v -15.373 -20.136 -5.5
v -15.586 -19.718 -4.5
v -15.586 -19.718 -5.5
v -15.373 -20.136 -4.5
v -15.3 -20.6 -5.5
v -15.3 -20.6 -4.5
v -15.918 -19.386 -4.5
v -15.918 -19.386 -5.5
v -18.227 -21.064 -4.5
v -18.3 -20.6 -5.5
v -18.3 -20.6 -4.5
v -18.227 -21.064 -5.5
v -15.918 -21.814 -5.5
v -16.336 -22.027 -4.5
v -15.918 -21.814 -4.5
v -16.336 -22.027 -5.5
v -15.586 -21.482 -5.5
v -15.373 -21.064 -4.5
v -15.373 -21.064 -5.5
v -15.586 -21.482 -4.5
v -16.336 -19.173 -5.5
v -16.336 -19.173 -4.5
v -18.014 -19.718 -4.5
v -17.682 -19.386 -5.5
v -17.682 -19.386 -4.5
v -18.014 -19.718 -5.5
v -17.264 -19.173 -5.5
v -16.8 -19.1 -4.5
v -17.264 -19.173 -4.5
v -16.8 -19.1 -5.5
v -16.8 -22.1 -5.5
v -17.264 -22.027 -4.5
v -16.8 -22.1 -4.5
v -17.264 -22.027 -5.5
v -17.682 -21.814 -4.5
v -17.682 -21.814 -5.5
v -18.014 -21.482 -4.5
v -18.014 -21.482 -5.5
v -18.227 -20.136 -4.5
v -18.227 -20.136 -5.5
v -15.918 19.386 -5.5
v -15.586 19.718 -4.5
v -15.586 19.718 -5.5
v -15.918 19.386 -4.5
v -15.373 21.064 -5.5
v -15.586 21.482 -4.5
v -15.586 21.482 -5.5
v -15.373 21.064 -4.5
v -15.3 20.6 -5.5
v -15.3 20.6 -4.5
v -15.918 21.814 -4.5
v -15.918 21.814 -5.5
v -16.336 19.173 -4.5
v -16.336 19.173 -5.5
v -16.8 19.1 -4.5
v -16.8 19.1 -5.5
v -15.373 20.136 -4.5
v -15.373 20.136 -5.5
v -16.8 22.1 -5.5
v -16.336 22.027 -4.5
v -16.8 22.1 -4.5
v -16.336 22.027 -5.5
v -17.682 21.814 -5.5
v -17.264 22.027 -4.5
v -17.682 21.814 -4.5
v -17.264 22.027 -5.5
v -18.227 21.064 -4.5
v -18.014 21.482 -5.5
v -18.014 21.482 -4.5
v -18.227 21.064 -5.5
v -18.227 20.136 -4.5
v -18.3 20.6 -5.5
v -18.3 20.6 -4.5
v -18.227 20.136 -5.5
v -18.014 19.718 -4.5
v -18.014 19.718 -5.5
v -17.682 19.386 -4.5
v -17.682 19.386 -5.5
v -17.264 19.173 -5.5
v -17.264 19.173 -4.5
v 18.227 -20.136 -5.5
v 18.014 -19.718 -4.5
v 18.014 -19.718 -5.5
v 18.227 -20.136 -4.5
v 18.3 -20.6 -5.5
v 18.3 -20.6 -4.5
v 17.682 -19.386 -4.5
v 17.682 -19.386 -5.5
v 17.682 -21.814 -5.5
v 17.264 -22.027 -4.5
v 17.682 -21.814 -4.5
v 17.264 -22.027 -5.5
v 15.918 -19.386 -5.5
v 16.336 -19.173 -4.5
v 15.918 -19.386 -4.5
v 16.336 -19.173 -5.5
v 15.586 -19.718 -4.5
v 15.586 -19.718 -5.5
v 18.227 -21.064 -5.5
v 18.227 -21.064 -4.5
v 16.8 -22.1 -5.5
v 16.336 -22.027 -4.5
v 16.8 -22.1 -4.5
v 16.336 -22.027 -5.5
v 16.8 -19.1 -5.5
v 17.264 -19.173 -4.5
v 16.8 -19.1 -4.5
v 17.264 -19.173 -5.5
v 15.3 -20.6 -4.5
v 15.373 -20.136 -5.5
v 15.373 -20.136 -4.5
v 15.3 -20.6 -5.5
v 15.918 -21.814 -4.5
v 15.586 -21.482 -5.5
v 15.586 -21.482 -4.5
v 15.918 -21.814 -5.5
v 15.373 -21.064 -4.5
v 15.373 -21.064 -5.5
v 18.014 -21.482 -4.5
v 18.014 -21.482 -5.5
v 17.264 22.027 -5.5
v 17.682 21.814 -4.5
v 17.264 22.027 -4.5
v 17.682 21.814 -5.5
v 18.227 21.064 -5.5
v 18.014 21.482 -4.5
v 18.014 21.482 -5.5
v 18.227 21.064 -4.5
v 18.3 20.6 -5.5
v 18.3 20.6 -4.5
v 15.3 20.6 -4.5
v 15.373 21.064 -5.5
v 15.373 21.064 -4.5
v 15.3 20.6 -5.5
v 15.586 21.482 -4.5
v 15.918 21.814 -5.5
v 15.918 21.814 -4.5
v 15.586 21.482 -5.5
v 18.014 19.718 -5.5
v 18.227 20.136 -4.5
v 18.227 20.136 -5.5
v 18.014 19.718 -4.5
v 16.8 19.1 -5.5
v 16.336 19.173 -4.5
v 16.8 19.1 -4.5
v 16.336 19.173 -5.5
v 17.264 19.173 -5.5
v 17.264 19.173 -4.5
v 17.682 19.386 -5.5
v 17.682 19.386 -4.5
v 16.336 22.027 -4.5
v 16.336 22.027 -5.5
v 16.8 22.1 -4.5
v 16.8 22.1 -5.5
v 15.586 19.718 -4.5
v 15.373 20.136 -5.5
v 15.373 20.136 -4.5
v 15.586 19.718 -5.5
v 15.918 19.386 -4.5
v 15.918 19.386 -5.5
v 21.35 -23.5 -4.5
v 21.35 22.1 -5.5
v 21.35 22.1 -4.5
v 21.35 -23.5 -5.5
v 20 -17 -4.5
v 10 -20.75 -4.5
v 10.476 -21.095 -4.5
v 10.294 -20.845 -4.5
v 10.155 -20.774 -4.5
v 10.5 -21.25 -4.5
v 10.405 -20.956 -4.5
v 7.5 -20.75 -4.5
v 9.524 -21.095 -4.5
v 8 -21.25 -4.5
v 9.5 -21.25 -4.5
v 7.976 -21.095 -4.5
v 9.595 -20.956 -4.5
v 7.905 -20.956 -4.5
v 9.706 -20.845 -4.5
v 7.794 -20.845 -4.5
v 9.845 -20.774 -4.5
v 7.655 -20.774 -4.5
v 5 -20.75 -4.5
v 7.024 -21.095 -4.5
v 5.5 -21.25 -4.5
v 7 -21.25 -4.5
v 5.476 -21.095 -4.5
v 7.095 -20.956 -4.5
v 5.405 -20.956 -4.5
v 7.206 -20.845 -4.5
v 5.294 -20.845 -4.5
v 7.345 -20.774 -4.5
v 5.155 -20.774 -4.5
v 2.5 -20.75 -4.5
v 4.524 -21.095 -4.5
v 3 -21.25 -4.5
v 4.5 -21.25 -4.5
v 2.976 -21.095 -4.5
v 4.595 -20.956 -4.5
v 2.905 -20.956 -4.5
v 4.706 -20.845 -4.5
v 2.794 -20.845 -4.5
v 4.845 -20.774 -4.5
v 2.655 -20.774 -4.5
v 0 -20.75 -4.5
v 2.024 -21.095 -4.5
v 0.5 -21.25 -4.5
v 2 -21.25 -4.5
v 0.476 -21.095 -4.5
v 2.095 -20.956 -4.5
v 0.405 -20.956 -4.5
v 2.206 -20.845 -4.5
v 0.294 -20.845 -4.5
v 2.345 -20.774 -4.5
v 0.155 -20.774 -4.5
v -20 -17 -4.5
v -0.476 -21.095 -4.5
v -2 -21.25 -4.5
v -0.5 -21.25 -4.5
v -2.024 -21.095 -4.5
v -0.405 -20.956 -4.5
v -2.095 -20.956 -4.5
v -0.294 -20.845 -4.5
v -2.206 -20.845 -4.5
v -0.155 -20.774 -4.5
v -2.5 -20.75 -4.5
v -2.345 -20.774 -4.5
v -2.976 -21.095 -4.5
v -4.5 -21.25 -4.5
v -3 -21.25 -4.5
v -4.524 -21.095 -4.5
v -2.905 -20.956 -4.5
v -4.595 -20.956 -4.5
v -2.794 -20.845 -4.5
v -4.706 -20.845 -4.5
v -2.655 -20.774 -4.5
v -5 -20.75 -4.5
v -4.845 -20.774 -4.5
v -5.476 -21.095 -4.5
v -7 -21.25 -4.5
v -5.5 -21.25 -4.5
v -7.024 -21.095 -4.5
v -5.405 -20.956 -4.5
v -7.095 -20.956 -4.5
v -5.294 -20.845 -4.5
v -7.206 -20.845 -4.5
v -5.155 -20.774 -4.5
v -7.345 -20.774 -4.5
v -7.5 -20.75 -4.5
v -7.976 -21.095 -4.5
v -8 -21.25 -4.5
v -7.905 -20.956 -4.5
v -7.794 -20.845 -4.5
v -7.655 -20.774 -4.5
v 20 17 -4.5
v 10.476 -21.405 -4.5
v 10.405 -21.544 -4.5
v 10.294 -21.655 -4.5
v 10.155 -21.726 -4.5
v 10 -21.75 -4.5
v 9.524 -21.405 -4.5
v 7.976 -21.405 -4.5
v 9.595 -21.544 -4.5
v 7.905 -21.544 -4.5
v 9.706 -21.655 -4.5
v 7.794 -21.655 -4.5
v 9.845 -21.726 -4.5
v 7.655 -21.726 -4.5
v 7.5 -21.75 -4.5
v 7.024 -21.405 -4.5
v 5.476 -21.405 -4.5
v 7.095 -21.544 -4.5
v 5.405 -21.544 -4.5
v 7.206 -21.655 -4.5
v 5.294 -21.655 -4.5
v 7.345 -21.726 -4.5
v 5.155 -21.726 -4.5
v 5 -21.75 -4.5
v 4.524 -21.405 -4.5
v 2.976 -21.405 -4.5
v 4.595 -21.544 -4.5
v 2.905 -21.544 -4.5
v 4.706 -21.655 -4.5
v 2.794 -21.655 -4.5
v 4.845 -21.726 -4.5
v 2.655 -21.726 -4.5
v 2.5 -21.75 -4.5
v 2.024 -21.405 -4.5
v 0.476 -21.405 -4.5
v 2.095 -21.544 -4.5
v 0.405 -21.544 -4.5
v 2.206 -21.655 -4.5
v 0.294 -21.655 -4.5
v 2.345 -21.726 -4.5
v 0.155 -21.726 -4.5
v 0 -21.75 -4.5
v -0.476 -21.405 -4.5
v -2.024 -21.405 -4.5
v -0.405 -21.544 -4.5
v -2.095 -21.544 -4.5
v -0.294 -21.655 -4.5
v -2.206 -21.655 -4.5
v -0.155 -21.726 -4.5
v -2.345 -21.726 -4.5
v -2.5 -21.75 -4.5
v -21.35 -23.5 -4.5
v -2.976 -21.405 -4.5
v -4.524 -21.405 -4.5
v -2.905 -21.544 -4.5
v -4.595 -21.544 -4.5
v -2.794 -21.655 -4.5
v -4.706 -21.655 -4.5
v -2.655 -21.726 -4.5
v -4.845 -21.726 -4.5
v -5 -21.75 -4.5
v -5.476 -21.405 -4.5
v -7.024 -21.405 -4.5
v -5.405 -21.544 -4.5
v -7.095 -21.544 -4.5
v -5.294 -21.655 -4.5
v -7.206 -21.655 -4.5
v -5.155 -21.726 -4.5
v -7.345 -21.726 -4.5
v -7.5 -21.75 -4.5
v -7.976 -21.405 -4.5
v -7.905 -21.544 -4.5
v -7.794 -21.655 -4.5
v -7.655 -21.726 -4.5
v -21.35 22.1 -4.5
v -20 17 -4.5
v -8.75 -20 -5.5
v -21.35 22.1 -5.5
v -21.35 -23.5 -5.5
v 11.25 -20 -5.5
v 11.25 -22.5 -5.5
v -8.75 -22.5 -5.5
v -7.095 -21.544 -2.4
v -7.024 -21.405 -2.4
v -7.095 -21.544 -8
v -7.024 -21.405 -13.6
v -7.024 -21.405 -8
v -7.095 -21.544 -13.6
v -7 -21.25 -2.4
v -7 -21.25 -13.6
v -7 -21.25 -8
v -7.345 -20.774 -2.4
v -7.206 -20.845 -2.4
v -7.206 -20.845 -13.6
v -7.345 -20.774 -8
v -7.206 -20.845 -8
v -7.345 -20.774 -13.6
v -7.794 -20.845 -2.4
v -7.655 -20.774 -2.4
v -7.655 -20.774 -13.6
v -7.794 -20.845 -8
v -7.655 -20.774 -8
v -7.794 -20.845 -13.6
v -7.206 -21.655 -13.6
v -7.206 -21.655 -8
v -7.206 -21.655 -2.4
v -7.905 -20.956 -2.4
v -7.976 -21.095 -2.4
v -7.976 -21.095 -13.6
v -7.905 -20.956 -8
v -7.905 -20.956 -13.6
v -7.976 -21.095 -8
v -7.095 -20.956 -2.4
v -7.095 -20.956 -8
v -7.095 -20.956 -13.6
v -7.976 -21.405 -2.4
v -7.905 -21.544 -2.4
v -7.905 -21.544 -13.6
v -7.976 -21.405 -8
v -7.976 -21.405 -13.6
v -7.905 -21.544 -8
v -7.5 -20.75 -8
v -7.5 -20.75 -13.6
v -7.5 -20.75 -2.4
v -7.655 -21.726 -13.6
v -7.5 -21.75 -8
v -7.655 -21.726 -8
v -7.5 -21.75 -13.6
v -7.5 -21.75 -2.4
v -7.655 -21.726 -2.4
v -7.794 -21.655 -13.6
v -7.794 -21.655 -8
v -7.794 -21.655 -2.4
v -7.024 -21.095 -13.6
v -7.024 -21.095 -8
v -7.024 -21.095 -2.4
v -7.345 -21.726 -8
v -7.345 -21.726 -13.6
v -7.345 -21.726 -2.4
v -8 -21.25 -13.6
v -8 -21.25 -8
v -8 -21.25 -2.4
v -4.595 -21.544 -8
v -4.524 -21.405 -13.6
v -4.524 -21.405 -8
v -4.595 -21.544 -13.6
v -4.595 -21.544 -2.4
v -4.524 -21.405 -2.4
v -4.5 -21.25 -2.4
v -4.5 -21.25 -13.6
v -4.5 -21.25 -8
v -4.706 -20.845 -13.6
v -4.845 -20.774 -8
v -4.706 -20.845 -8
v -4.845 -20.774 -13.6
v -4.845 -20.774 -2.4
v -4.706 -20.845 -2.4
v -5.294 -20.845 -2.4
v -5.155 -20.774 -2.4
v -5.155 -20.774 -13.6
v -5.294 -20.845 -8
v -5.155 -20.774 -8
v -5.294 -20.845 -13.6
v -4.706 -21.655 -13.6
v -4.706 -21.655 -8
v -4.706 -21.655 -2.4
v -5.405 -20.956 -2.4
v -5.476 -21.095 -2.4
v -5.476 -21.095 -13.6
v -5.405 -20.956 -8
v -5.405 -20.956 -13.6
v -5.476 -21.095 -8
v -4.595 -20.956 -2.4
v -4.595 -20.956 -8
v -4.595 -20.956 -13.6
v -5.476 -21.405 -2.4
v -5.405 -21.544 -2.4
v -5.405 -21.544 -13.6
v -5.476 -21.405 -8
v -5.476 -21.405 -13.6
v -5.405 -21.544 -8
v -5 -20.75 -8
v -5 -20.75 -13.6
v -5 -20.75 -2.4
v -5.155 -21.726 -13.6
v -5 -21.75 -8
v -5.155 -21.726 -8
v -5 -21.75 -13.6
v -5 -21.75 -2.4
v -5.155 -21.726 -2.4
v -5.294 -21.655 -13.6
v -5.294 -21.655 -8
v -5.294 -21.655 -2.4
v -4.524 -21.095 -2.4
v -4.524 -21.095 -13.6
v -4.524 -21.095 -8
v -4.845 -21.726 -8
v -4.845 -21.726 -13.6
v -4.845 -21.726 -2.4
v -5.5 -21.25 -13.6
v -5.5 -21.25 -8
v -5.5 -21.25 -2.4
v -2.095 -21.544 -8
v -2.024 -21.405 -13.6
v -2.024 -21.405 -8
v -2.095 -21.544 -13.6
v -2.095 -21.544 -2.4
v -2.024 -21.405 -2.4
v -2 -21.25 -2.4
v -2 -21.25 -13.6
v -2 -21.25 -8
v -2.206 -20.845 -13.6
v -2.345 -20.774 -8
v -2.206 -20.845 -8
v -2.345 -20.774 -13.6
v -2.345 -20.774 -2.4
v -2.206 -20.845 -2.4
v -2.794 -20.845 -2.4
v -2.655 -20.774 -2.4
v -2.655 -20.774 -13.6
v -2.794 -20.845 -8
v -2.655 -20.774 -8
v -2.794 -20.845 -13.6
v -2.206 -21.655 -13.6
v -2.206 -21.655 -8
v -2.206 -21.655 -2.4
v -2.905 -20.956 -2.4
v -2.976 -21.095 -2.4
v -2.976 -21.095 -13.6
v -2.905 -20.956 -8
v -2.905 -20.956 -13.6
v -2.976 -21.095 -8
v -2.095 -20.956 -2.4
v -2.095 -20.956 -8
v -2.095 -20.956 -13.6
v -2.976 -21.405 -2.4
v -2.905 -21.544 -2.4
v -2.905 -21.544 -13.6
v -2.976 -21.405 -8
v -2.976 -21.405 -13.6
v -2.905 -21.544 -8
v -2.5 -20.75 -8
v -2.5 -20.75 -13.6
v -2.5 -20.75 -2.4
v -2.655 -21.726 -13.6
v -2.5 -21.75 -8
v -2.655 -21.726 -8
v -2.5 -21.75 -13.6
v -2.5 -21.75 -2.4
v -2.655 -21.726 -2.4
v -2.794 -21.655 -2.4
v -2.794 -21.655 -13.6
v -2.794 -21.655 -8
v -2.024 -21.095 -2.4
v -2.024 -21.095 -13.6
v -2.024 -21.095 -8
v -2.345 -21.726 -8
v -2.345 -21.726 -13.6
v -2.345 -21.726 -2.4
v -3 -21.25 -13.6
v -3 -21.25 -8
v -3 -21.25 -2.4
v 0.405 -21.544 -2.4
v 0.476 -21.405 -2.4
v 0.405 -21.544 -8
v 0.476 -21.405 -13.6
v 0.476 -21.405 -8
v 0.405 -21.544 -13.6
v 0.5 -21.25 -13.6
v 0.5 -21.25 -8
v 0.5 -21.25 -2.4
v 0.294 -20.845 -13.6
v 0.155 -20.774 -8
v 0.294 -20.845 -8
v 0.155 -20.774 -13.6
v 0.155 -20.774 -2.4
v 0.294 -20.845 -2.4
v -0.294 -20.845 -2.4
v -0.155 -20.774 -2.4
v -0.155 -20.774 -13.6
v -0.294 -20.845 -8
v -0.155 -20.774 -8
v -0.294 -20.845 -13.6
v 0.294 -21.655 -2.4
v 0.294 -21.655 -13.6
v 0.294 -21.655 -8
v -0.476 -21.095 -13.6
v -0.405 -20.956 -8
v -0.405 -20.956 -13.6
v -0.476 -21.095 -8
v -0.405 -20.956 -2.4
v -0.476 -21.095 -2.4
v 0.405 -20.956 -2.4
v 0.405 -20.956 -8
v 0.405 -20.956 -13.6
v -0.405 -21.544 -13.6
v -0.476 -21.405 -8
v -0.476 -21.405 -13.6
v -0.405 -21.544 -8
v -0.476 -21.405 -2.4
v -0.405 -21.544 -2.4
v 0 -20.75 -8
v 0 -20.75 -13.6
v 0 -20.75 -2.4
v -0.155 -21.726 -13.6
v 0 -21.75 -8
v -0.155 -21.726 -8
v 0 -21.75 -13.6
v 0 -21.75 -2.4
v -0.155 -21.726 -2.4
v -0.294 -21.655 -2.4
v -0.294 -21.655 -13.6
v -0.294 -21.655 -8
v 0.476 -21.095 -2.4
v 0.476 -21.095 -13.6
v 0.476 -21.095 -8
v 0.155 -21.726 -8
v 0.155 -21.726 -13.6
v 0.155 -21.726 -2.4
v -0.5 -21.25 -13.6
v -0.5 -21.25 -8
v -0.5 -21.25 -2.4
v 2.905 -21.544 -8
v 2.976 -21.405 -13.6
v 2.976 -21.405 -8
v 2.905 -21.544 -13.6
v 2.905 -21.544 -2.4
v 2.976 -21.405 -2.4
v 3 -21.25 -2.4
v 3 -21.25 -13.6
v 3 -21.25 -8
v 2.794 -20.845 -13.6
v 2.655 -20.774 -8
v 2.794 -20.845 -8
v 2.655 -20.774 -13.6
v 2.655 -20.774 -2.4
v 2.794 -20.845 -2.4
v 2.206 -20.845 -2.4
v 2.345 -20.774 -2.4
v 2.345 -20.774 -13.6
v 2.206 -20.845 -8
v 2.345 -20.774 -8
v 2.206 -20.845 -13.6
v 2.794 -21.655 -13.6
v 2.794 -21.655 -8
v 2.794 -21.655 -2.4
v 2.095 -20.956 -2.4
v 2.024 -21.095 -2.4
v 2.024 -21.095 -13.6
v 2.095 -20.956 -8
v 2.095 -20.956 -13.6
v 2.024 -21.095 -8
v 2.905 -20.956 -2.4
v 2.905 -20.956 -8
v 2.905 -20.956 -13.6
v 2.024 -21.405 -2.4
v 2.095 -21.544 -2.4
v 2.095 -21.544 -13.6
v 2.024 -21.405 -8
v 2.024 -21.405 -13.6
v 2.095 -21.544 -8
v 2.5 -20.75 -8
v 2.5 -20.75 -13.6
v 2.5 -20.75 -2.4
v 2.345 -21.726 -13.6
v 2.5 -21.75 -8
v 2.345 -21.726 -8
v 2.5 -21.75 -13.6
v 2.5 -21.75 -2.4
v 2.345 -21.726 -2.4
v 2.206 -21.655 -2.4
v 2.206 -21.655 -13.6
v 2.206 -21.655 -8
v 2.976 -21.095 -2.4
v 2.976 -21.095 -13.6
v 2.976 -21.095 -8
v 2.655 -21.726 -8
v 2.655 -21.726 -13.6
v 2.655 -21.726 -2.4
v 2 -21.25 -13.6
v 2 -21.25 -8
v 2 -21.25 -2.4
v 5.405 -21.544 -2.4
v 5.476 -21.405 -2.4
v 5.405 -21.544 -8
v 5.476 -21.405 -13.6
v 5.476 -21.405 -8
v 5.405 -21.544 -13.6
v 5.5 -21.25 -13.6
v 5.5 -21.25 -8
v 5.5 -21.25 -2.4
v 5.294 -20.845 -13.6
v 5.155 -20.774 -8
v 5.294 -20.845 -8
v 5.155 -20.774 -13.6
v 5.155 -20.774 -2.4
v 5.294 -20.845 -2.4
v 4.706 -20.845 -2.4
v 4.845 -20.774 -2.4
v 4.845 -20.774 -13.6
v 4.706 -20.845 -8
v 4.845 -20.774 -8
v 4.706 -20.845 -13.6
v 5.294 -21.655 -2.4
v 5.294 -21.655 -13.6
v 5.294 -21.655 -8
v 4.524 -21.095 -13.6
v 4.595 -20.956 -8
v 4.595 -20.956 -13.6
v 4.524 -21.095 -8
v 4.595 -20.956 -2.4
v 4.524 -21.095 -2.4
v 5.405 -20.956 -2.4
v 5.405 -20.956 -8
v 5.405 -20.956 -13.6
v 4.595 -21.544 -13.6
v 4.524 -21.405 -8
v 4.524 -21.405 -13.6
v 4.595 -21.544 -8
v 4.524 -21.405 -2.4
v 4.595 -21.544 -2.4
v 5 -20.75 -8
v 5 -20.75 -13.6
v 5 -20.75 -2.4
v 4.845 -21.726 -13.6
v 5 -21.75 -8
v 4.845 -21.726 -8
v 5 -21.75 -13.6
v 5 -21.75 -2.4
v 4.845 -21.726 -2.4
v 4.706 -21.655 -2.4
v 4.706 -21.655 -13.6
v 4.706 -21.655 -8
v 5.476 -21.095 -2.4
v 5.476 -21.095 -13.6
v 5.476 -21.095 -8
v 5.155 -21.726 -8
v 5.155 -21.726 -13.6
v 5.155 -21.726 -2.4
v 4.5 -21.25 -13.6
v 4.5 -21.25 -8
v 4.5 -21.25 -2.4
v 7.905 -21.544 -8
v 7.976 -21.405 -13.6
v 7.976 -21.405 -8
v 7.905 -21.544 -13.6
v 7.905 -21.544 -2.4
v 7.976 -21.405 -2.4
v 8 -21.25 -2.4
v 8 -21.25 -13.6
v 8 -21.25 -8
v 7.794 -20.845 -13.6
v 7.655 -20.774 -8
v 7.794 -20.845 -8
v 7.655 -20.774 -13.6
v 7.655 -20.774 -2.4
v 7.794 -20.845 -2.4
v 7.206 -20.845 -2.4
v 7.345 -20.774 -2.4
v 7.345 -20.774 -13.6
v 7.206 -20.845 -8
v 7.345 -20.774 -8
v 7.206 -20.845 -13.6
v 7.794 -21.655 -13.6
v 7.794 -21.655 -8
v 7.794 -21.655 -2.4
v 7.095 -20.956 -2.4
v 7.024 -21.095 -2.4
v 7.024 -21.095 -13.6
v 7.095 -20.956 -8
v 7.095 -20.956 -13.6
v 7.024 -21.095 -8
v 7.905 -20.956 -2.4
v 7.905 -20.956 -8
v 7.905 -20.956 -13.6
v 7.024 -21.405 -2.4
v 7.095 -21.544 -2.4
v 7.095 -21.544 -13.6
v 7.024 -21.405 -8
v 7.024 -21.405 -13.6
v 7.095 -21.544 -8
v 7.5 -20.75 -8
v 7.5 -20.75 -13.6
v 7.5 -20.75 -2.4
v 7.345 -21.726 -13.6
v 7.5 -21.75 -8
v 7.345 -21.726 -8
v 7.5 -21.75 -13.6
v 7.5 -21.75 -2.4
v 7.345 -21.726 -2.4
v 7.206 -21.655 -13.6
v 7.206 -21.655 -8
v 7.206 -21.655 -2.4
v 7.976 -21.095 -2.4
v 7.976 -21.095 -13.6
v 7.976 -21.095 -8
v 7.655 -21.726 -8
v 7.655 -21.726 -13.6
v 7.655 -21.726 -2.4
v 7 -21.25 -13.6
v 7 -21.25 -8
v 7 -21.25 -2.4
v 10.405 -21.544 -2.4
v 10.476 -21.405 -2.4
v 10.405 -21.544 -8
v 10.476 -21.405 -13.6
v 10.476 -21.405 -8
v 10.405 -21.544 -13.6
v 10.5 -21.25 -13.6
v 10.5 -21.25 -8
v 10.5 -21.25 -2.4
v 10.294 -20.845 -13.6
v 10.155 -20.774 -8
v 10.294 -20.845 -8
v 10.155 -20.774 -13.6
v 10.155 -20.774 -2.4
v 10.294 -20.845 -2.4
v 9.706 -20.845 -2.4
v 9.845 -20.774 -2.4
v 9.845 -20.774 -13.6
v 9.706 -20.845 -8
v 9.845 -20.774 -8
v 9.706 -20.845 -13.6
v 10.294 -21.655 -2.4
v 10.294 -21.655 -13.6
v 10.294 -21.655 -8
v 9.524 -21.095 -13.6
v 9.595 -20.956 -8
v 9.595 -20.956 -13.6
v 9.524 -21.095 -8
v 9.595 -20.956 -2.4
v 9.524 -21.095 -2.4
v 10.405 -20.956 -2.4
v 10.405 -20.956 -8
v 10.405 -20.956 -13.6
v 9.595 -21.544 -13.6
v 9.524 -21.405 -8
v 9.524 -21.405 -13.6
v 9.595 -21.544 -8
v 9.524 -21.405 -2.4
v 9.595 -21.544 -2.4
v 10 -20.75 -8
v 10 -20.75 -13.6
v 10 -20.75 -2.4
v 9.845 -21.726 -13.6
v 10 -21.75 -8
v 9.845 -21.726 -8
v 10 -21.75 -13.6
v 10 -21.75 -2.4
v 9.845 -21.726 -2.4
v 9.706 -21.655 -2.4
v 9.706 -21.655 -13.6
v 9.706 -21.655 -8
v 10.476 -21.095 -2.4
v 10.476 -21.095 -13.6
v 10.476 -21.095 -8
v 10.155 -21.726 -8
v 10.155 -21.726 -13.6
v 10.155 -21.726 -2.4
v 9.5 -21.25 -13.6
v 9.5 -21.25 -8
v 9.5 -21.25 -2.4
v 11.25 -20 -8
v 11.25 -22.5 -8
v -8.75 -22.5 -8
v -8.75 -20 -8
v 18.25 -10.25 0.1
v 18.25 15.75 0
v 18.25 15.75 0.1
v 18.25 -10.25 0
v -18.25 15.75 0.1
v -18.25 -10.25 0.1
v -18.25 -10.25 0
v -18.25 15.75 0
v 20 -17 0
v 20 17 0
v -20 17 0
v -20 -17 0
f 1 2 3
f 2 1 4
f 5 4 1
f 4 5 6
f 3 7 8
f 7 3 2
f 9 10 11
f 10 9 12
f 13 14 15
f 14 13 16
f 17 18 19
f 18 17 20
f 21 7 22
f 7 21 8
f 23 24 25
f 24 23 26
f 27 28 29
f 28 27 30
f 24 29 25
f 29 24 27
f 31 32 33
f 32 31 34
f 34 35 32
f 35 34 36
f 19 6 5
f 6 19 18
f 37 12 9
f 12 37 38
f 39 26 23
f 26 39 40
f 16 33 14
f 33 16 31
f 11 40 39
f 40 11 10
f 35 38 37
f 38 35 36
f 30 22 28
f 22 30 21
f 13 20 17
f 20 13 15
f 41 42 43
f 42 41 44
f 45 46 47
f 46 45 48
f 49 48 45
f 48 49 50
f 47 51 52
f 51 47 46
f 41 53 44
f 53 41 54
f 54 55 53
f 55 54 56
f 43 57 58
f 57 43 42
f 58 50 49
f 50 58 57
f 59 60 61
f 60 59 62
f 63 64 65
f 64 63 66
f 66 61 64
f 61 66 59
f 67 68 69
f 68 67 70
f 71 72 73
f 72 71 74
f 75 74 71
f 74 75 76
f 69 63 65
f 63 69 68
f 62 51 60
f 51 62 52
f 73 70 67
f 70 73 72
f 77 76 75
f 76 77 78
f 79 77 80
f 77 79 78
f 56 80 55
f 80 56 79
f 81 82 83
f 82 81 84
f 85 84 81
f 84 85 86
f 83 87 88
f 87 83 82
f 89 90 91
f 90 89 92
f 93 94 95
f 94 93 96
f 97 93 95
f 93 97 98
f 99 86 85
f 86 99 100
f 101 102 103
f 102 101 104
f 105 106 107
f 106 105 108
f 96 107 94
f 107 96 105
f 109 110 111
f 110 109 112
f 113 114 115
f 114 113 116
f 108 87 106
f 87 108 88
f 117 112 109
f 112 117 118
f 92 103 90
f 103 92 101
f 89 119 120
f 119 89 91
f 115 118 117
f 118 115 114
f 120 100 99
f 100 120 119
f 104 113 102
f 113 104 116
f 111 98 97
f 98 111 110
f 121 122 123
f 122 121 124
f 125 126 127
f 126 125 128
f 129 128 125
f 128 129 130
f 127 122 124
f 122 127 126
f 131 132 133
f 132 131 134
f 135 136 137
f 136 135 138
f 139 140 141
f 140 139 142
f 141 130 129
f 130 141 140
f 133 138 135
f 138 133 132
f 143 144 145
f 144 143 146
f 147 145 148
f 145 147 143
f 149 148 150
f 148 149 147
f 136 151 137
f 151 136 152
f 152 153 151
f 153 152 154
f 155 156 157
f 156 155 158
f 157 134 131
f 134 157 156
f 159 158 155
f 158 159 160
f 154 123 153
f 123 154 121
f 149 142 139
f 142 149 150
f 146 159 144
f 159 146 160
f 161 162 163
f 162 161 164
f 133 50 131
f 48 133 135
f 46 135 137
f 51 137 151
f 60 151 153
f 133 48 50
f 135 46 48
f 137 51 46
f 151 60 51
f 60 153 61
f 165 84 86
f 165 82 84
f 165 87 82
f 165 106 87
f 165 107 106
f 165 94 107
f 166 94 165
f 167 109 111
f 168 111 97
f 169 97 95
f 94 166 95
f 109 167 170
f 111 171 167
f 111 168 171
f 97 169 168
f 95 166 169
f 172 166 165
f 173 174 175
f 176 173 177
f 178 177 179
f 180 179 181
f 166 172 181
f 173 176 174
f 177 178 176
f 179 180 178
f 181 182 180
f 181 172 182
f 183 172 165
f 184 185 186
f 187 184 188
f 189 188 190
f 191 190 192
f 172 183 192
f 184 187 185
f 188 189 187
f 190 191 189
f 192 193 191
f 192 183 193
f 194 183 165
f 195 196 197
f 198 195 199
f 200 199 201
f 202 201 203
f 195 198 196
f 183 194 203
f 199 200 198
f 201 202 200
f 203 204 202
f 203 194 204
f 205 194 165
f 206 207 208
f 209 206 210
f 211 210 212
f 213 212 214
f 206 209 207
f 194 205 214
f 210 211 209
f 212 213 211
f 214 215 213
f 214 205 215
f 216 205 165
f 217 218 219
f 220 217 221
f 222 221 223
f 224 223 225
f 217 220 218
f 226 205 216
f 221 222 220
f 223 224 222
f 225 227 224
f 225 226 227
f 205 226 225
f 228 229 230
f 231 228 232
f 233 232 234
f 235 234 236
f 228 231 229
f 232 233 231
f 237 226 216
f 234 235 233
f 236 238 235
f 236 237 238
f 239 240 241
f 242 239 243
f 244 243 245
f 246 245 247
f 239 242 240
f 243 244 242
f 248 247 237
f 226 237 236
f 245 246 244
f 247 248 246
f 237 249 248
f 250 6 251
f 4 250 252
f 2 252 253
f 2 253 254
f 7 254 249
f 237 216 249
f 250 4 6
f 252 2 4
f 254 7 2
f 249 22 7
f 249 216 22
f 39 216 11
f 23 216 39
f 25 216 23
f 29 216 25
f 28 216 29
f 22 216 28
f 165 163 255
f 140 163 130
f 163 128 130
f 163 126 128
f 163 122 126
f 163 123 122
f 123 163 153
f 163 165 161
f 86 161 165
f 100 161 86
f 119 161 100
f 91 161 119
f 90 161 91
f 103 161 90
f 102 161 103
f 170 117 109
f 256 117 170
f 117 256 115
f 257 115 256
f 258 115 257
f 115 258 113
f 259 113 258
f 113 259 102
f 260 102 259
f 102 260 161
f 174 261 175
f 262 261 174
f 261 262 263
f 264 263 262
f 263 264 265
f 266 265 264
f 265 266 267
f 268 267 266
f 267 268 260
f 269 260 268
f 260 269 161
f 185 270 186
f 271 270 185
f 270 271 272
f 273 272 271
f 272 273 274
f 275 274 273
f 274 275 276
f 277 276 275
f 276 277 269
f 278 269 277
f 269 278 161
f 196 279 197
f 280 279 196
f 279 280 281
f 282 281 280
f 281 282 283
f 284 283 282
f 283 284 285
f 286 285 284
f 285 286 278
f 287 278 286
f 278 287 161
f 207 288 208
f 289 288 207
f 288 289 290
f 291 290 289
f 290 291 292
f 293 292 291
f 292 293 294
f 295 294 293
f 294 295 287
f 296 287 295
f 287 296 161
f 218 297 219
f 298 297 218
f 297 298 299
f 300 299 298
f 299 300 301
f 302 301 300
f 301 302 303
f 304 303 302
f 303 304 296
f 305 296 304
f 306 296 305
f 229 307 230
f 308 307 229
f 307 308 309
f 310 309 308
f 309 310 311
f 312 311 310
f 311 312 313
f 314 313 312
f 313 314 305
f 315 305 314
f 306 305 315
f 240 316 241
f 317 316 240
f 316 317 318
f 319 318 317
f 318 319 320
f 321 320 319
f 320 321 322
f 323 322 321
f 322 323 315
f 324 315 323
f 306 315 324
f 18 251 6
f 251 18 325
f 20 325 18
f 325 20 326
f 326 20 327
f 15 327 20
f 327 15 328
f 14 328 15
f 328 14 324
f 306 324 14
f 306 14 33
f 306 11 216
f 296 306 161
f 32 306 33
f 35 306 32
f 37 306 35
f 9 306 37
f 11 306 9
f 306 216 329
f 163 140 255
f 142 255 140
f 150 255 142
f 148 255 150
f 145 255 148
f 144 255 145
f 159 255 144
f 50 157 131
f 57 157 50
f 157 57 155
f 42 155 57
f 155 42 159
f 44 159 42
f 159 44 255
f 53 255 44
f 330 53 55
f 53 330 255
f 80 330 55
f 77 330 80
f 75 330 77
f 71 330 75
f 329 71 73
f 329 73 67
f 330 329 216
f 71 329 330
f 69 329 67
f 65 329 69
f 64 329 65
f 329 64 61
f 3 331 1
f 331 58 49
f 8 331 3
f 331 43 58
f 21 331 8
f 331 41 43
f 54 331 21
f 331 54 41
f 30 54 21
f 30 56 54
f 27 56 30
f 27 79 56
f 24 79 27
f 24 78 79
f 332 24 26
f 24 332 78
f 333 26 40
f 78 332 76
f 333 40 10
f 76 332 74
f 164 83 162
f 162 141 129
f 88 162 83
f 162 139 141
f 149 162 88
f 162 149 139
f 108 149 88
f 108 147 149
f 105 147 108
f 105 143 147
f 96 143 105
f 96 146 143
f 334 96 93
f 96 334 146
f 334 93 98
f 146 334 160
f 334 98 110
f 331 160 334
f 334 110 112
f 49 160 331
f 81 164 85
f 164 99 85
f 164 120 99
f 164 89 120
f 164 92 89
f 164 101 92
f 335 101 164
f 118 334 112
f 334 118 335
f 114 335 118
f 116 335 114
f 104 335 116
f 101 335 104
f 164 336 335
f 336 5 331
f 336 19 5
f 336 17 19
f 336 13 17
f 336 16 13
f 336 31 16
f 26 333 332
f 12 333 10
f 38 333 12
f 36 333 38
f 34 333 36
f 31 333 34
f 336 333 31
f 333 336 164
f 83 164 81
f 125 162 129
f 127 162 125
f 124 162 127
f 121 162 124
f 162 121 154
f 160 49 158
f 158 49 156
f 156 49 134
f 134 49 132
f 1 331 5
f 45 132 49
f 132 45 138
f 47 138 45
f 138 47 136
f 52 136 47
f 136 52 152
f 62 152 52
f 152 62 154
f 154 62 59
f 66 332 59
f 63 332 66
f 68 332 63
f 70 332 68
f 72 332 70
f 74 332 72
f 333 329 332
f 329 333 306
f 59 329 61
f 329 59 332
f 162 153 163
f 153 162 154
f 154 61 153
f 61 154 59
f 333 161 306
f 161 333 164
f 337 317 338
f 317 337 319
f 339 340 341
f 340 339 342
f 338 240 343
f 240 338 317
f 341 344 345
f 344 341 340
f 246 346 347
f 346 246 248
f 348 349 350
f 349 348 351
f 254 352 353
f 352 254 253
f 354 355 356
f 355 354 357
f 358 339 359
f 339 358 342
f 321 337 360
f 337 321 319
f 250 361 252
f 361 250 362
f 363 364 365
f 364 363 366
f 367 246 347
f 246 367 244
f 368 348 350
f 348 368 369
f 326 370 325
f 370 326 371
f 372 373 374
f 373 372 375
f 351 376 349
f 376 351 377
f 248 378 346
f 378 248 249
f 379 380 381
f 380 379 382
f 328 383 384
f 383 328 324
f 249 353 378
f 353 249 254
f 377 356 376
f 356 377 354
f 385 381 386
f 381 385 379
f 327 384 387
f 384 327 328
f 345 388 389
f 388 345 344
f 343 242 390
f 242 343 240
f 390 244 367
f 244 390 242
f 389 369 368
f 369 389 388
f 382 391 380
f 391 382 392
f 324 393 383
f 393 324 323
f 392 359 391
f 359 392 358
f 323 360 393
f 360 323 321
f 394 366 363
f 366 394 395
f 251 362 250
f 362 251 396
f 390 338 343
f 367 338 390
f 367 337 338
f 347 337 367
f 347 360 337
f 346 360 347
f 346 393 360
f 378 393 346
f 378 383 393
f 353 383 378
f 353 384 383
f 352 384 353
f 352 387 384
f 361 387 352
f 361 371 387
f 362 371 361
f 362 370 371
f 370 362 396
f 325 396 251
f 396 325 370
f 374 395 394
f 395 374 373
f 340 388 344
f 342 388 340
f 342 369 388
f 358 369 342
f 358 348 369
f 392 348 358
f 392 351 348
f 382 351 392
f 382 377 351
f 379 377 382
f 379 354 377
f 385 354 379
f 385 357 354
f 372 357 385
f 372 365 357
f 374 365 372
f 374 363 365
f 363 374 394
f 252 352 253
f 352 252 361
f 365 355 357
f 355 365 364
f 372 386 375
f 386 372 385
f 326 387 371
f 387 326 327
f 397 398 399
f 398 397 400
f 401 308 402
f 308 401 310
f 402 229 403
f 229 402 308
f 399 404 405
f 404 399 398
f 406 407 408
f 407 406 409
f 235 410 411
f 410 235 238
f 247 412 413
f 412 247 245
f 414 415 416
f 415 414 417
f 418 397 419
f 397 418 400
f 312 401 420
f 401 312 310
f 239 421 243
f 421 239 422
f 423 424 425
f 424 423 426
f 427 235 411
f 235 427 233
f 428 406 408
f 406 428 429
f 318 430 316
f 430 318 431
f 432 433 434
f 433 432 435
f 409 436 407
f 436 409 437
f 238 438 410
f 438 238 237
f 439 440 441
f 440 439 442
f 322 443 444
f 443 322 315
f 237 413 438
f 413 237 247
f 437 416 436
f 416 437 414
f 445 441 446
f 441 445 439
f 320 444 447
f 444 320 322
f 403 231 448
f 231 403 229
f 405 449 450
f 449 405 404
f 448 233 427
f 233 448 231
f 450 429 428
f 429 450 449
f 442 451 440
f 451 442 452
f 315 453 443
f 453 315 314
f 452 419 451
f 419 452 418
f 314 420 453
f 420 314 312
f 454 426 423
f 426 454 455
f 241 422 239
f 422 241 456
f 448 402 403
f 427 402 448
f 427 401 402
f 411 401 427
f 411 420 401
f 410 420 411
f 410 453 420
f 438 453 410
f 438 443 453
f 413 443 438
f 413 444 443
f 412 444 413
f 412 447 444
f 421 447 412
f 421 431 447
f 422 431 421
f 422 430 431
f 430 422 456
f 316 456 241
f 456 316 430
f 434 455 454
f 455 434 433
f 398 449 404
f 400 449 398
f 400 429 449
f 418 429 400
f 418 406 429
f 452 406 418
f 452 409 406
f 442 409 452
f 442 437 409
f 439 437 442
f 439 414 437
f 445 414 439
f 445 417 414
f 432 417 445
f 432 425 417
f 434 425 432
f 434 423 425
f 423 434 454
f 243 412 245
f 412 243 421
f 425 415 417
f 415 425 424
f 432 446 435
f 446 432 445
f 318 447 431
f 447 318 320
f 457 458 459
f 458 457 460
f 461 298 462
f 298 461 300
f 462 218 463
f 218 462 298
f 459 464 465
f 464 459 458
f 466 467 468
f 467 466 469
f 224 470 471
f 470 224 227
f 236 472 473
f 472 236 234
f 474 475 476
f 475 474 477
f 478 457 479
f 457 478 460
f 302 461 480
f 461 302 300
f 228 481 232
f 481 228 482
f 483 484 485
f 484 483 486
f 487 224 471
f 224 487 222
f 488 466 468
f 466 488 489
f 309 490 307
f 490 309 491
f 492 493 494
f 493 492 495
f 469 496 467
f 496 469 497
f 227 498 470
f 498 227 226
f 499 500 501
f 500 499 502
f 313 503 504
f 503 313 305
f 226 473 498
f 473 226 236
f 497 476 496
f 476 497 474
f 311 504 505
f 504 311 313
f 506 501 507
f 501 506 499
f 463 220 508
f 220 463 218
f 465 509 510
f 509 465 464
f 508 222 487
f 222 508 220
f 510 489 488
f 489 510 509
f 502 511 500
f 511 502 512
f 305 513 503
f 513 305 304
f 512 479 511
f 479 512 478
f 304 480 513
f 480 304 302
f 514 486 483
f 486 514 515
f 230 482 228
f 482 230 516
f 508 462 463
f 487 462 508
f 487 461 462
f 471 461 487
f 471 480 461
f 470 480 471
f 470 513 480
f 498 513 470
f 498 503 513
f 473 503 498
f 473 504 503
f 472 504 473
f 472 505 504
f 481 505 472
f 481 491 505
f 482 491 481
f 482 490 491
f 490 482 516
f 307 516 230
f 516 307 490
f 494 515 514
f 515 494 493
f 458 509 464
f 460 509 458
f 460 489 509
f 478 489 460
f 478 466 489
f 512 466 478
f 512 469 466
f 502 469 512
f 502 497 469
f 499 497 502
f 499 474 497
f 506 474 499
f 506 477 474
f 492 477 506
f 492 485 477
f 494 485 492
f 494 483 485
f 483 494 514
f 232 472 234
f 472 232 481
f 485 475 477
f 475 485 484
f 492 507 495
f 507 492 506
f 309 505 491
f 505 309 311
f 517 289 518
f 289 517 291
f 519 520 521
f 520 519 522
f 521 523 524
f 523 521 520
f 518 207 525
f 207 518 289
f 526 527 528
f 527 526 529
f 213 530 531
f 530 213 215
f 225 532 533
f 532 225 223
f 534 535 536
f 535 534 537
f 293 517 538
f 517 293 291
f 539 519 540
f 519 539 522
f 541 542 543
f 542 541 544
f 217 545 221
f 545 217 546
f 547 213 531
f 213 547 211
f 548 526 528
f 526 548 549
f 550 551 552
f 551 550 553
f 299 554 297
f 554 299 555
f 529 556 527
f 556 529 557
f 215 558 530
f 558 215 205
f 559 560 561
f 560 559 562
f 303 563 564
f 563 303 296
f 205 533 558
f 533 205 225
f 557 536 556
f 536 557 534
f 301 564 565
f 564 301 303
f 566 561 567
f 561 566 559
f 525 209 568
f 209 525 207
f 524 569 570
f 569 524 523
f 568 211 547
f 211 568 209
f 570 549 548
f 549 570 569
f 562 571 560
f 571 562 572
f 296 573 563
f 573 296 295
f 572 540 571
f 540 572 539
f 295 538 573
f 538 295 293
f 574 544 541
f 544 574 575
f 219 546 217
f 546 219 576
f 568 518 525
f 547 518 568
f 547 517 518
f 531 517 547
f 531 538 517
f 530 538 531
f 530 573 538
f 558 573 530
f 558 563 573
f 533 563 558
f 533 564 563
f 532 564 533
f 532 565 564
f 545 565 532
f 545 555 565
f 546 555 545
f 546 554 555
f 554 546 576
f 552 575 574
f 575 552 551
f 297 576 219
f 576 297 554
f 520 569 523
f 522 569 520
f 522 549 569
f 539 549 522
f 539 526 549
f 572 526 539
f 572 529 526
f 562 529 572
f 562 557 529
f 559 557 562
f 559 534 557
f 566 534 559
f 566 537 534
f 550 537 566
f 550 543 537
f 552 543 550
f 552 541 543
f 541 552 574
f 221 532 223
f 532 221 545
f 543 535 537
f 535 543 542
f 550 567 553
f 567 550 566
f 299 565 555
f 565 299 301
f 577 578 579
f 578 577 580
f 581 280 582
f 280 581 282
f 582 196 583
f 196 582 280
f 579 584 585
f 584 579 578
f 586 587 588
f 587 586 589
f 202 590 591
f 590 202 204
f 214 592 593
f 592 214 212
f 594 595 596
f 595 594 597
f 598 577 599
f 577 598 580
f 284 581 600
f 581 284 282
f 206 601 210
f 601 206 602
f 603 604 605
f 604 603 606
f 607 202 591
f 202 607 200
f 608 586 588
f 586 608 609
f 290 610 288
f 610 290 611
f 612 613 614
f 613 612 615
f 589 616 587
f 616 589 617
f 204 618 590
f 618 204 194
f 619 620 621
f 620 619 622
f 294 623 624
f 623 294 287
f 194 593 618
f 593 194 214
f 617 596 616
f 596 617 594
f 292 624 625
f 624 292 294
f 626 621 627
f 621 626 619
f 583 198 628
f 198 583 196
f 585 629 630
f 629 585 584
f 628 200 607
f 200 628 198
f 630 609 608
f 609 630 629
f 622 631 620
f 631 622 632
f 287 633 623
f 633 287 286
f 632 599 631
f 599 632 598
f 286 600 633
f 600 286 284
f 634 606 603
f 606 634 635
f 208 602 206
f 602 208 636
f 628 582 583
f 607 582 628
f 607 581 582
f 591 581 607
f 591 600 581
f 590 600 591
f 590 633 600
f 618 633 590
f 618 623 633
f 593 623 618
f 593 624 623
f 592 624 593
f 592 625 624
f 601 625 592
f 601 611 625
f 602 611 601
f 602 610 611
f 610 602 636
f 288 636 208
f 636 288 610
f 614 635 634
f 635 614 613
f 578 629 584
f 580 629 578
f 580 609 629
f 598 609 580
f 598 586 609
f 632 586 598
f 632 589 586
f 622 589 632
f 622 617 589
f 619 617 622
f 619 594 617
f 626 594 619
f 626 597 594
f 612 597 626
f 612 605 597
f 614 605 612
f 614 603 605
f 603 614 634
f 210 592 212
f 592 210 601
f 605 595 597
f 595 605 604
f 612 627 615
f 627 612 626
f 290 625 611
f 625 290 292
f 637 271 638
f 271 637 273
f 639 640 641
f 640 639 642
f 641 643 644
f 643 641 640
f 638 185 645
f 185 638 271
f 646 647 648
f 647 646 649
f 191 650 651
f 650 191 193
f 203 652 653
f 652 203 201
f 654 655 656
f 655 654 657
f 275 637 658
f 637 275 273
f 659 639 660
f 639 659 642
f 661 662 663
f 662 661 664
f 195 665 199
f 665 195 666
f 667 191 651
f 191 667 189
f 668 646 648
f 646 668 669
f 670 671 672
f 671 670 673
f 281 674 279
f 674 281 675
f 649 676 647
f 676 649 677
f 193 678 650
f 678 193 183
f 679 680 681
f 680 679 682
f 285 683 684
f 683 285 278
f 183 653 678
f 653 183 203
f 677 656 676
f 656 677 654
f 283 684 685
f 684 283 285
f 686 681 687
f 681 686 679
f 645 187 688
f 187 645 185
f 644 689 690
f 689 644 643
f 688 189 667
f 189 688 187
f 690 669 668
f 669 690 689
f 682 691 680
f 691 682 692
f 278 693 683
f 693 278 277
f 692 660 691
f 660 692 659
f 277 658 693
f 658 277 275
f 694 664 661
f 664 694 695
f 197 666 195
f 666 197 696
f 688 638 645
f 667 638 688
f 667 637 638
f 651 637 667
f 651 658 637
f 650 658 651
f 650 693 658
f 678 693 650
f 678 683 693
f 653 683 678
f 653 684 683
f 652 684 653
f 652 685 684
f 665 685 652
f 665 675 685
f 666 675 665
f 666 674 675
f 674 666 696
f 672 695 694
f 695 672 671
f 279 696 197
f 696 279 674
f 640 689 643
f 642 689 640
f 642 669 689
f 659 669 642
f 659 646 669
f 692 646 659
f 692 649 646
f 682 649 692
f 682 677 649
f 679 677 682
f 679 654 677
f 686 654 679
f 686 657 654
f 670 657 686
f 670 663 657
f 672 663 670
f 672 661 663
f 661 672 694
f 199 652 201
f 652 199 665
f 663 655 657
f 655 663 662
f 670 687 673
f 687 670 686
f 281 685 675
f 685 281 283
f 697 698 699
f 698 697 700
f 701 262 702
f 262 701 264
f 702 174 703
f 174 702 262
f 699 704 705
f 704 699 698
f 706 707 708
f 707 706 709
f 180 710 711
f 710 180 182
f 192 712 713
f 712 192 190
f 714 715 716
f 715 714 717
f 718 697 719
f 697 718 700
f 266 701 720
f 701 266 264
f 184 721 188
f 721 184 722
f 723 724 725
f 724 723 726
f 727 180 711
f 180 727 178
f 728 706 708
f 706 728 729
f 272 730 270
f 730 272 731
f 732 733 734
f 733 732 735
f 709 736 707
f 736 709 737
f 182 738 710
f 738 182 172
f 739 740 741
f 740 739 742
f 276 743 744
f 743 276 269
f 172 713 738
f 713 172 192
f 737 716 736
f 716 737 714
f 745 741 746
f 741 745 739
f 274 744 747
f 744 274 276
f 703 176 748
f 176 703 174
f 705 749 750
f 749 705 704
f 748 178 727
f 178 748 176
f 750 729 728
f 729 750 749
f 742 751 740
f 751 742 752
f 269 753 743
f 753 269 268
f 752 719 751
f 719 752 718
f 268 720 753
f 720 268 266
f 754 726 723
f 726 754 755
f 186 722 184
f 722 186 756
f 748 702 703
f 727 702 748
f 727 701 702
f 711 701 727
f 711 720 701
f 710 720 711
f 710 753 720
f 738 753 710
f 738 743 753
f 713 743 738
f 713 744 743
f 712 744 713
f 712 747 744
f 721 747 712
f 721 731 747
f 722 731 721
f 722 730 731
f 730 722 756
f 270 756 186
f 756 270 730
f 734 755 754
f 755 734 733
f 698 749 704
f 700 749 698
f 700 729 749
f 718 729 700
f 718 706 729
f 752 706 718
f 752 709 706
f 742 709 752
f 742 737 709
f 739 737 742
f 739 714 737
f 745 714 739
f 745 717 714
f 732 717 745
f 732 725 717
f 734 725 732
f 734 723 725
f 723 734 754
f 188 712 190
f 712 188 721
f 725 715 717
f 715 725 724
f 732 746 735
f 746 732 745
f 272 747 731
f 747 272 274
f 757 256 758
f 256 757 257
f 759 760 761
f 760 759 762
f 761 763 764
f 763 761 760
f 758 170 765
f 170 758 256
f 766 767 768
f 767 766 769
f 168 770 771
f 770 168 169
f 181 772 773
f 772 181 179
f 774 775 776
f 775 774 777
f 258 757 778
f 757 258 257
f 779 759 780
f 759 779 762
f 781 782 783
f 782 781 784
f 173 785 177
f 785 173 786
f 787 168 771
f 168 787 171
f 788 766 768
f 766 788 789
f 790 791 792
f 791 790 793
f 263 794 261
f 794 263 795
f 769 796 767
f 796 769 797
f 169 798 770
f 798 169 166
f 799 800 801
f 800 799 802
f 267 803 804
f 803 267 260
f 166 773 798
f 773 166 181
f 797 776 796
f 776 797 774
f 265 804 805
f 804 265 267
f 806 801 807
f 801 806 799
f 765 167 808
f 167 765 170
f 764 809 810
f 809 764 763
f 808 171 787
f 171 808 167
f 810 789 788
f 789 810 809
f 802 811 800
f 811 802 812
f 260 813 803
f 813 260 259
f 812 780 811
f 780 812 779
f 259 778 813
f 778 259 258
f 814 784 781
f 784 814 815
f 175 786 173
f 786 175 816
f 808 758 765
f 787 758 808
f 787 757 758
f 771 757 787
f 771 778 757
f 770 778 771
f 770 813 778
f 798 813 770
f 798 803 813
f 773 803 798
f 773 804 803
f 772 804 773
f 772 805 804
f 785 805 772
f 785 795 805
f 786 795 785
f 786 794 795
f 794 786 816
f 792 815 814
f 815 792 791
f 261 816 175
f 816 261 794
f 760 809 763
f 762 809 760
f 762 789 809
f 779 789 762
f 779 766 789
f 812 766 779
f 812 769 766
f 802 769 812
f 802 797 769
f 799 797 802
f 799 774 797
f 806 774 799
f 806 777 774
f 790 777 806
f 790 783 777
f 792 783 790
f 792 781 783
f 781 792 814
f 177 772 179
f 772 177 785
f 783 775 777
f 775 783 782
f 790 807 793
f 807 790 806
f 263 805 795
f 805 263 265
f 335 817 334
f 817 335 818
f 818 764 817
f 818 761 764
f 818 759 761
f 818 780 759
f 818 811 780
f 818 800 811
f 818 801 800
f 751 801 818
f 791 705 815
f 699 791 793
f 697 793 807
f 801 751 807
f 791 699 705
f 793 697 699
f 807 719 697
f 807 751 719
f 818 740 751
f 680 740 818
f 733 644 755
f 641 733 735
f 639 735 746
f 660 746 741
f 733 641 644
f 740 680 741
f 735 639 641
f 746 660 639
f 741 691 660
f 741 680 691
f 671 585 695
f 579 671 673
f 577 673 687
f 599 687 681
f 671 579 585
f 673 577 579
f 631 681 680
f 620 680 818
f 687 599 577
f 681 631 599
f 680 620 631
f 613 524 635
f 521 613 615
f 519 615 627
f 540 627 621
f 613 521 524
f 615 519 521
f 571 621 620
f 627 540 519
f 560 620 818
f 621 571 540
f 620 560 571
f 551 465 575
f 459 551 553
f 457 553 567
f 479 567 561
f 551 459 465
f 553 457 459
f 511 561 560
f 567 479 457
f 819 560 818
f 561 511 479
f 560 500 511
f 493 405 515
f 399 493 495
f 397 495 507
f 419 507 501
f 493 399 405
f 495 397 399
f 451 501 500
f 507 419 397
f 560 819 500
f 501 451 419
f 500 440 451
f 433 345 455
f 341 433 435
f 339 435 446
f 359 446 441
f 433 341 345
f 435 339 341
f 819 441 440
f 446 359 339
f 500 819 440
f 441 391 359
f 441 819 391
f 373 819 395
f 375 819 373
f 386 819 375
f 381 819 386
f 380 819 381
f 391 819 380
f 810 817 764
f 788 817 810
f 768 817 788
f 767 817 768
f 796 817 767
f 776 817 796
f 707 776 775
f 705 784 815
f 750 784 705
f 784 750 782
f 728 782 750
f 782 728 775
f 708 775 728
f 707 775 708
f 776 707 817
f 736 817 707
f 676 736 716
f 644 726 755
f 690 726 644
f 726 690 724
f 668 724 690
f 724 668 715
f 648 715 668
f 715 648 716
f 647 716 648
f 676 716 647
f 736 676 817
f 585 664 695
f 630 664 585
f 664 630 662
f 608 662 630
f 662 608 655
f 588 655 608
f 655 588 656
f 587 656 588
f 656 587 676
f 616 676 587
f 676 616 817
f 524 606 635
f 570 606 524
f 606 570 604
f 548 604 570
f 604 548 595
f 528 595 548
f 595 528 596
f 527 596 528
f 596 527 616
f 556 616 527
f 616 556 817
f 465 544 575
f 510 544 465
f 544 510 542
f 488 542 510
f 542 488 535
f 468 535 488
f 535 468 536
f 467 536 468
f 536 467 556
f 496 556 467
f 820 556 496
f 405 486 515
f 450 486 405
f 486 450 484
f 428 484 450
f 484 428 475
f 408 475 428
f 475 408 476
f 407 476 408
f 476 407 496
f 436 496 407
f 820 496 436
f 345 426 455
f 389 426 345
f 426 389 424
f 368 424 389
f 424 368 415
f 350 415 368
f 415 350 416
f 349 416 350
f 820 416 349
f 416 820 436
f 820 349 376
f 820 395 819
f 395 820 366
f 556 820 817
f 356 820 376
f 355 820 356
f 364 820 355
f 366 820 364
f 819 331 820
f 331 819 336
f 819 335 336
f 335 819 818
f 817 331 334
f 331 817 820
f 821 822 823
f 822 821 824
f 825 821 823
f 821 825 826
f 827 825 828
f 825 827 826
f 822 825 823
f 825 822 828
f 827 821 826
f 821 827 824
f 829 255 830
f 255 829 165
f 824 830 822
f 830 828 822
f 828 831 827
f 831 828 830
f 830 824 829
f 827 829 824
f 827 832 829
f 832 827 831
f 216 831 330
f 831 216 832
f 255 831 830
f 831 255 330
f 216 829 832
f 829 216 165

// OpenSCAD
// file: maleHeader.scad
module maleHeader(pins=40,pinLength=11.2,rotation=0){
    length=2.5 * pins;
    color("Black") cube([length,2.5,2.5]);  //plastic base
    for (i=[0:pins-1]){ //pins
        translate([1.25+2.5*i,1.25,2.5]) color("white") cylinder(r=0.5,h=pinLength,center=true,$fn=20);
    }
}
maleHeader(pins=5,pinLength=7);
// main file
use <maleHeader.scad>

module oledDisplay(xCtrs=33.6,yCtrs=41.2){
    translate([0,0,-5.5]){    //  set origin
        translate([0,2.75,5.5]) color("grey") cube([36.5,26,0.2],center=true); //view area
        translate([0,0,3.25]) color("white") cube([40,34,4.5],center=true);  //screen
        difference(){
            translate([0,-0.7,0.5]) color("SteelBlue") cube([42.7,45.6,1],center=true);    //pcb
            for (i=[-1:2:1],j=[-1:2:1]){
              translate([i*xCtrs/2,j*yCtrs/2,-.2]) cylinder(r=1.5,h=2,$fn=20);  
            }
        }
        translate([-4*2.5+1.25,-20]) rotate([180,0,0]) maleHeader(pins=8);
    }
}


oledDisplay();
